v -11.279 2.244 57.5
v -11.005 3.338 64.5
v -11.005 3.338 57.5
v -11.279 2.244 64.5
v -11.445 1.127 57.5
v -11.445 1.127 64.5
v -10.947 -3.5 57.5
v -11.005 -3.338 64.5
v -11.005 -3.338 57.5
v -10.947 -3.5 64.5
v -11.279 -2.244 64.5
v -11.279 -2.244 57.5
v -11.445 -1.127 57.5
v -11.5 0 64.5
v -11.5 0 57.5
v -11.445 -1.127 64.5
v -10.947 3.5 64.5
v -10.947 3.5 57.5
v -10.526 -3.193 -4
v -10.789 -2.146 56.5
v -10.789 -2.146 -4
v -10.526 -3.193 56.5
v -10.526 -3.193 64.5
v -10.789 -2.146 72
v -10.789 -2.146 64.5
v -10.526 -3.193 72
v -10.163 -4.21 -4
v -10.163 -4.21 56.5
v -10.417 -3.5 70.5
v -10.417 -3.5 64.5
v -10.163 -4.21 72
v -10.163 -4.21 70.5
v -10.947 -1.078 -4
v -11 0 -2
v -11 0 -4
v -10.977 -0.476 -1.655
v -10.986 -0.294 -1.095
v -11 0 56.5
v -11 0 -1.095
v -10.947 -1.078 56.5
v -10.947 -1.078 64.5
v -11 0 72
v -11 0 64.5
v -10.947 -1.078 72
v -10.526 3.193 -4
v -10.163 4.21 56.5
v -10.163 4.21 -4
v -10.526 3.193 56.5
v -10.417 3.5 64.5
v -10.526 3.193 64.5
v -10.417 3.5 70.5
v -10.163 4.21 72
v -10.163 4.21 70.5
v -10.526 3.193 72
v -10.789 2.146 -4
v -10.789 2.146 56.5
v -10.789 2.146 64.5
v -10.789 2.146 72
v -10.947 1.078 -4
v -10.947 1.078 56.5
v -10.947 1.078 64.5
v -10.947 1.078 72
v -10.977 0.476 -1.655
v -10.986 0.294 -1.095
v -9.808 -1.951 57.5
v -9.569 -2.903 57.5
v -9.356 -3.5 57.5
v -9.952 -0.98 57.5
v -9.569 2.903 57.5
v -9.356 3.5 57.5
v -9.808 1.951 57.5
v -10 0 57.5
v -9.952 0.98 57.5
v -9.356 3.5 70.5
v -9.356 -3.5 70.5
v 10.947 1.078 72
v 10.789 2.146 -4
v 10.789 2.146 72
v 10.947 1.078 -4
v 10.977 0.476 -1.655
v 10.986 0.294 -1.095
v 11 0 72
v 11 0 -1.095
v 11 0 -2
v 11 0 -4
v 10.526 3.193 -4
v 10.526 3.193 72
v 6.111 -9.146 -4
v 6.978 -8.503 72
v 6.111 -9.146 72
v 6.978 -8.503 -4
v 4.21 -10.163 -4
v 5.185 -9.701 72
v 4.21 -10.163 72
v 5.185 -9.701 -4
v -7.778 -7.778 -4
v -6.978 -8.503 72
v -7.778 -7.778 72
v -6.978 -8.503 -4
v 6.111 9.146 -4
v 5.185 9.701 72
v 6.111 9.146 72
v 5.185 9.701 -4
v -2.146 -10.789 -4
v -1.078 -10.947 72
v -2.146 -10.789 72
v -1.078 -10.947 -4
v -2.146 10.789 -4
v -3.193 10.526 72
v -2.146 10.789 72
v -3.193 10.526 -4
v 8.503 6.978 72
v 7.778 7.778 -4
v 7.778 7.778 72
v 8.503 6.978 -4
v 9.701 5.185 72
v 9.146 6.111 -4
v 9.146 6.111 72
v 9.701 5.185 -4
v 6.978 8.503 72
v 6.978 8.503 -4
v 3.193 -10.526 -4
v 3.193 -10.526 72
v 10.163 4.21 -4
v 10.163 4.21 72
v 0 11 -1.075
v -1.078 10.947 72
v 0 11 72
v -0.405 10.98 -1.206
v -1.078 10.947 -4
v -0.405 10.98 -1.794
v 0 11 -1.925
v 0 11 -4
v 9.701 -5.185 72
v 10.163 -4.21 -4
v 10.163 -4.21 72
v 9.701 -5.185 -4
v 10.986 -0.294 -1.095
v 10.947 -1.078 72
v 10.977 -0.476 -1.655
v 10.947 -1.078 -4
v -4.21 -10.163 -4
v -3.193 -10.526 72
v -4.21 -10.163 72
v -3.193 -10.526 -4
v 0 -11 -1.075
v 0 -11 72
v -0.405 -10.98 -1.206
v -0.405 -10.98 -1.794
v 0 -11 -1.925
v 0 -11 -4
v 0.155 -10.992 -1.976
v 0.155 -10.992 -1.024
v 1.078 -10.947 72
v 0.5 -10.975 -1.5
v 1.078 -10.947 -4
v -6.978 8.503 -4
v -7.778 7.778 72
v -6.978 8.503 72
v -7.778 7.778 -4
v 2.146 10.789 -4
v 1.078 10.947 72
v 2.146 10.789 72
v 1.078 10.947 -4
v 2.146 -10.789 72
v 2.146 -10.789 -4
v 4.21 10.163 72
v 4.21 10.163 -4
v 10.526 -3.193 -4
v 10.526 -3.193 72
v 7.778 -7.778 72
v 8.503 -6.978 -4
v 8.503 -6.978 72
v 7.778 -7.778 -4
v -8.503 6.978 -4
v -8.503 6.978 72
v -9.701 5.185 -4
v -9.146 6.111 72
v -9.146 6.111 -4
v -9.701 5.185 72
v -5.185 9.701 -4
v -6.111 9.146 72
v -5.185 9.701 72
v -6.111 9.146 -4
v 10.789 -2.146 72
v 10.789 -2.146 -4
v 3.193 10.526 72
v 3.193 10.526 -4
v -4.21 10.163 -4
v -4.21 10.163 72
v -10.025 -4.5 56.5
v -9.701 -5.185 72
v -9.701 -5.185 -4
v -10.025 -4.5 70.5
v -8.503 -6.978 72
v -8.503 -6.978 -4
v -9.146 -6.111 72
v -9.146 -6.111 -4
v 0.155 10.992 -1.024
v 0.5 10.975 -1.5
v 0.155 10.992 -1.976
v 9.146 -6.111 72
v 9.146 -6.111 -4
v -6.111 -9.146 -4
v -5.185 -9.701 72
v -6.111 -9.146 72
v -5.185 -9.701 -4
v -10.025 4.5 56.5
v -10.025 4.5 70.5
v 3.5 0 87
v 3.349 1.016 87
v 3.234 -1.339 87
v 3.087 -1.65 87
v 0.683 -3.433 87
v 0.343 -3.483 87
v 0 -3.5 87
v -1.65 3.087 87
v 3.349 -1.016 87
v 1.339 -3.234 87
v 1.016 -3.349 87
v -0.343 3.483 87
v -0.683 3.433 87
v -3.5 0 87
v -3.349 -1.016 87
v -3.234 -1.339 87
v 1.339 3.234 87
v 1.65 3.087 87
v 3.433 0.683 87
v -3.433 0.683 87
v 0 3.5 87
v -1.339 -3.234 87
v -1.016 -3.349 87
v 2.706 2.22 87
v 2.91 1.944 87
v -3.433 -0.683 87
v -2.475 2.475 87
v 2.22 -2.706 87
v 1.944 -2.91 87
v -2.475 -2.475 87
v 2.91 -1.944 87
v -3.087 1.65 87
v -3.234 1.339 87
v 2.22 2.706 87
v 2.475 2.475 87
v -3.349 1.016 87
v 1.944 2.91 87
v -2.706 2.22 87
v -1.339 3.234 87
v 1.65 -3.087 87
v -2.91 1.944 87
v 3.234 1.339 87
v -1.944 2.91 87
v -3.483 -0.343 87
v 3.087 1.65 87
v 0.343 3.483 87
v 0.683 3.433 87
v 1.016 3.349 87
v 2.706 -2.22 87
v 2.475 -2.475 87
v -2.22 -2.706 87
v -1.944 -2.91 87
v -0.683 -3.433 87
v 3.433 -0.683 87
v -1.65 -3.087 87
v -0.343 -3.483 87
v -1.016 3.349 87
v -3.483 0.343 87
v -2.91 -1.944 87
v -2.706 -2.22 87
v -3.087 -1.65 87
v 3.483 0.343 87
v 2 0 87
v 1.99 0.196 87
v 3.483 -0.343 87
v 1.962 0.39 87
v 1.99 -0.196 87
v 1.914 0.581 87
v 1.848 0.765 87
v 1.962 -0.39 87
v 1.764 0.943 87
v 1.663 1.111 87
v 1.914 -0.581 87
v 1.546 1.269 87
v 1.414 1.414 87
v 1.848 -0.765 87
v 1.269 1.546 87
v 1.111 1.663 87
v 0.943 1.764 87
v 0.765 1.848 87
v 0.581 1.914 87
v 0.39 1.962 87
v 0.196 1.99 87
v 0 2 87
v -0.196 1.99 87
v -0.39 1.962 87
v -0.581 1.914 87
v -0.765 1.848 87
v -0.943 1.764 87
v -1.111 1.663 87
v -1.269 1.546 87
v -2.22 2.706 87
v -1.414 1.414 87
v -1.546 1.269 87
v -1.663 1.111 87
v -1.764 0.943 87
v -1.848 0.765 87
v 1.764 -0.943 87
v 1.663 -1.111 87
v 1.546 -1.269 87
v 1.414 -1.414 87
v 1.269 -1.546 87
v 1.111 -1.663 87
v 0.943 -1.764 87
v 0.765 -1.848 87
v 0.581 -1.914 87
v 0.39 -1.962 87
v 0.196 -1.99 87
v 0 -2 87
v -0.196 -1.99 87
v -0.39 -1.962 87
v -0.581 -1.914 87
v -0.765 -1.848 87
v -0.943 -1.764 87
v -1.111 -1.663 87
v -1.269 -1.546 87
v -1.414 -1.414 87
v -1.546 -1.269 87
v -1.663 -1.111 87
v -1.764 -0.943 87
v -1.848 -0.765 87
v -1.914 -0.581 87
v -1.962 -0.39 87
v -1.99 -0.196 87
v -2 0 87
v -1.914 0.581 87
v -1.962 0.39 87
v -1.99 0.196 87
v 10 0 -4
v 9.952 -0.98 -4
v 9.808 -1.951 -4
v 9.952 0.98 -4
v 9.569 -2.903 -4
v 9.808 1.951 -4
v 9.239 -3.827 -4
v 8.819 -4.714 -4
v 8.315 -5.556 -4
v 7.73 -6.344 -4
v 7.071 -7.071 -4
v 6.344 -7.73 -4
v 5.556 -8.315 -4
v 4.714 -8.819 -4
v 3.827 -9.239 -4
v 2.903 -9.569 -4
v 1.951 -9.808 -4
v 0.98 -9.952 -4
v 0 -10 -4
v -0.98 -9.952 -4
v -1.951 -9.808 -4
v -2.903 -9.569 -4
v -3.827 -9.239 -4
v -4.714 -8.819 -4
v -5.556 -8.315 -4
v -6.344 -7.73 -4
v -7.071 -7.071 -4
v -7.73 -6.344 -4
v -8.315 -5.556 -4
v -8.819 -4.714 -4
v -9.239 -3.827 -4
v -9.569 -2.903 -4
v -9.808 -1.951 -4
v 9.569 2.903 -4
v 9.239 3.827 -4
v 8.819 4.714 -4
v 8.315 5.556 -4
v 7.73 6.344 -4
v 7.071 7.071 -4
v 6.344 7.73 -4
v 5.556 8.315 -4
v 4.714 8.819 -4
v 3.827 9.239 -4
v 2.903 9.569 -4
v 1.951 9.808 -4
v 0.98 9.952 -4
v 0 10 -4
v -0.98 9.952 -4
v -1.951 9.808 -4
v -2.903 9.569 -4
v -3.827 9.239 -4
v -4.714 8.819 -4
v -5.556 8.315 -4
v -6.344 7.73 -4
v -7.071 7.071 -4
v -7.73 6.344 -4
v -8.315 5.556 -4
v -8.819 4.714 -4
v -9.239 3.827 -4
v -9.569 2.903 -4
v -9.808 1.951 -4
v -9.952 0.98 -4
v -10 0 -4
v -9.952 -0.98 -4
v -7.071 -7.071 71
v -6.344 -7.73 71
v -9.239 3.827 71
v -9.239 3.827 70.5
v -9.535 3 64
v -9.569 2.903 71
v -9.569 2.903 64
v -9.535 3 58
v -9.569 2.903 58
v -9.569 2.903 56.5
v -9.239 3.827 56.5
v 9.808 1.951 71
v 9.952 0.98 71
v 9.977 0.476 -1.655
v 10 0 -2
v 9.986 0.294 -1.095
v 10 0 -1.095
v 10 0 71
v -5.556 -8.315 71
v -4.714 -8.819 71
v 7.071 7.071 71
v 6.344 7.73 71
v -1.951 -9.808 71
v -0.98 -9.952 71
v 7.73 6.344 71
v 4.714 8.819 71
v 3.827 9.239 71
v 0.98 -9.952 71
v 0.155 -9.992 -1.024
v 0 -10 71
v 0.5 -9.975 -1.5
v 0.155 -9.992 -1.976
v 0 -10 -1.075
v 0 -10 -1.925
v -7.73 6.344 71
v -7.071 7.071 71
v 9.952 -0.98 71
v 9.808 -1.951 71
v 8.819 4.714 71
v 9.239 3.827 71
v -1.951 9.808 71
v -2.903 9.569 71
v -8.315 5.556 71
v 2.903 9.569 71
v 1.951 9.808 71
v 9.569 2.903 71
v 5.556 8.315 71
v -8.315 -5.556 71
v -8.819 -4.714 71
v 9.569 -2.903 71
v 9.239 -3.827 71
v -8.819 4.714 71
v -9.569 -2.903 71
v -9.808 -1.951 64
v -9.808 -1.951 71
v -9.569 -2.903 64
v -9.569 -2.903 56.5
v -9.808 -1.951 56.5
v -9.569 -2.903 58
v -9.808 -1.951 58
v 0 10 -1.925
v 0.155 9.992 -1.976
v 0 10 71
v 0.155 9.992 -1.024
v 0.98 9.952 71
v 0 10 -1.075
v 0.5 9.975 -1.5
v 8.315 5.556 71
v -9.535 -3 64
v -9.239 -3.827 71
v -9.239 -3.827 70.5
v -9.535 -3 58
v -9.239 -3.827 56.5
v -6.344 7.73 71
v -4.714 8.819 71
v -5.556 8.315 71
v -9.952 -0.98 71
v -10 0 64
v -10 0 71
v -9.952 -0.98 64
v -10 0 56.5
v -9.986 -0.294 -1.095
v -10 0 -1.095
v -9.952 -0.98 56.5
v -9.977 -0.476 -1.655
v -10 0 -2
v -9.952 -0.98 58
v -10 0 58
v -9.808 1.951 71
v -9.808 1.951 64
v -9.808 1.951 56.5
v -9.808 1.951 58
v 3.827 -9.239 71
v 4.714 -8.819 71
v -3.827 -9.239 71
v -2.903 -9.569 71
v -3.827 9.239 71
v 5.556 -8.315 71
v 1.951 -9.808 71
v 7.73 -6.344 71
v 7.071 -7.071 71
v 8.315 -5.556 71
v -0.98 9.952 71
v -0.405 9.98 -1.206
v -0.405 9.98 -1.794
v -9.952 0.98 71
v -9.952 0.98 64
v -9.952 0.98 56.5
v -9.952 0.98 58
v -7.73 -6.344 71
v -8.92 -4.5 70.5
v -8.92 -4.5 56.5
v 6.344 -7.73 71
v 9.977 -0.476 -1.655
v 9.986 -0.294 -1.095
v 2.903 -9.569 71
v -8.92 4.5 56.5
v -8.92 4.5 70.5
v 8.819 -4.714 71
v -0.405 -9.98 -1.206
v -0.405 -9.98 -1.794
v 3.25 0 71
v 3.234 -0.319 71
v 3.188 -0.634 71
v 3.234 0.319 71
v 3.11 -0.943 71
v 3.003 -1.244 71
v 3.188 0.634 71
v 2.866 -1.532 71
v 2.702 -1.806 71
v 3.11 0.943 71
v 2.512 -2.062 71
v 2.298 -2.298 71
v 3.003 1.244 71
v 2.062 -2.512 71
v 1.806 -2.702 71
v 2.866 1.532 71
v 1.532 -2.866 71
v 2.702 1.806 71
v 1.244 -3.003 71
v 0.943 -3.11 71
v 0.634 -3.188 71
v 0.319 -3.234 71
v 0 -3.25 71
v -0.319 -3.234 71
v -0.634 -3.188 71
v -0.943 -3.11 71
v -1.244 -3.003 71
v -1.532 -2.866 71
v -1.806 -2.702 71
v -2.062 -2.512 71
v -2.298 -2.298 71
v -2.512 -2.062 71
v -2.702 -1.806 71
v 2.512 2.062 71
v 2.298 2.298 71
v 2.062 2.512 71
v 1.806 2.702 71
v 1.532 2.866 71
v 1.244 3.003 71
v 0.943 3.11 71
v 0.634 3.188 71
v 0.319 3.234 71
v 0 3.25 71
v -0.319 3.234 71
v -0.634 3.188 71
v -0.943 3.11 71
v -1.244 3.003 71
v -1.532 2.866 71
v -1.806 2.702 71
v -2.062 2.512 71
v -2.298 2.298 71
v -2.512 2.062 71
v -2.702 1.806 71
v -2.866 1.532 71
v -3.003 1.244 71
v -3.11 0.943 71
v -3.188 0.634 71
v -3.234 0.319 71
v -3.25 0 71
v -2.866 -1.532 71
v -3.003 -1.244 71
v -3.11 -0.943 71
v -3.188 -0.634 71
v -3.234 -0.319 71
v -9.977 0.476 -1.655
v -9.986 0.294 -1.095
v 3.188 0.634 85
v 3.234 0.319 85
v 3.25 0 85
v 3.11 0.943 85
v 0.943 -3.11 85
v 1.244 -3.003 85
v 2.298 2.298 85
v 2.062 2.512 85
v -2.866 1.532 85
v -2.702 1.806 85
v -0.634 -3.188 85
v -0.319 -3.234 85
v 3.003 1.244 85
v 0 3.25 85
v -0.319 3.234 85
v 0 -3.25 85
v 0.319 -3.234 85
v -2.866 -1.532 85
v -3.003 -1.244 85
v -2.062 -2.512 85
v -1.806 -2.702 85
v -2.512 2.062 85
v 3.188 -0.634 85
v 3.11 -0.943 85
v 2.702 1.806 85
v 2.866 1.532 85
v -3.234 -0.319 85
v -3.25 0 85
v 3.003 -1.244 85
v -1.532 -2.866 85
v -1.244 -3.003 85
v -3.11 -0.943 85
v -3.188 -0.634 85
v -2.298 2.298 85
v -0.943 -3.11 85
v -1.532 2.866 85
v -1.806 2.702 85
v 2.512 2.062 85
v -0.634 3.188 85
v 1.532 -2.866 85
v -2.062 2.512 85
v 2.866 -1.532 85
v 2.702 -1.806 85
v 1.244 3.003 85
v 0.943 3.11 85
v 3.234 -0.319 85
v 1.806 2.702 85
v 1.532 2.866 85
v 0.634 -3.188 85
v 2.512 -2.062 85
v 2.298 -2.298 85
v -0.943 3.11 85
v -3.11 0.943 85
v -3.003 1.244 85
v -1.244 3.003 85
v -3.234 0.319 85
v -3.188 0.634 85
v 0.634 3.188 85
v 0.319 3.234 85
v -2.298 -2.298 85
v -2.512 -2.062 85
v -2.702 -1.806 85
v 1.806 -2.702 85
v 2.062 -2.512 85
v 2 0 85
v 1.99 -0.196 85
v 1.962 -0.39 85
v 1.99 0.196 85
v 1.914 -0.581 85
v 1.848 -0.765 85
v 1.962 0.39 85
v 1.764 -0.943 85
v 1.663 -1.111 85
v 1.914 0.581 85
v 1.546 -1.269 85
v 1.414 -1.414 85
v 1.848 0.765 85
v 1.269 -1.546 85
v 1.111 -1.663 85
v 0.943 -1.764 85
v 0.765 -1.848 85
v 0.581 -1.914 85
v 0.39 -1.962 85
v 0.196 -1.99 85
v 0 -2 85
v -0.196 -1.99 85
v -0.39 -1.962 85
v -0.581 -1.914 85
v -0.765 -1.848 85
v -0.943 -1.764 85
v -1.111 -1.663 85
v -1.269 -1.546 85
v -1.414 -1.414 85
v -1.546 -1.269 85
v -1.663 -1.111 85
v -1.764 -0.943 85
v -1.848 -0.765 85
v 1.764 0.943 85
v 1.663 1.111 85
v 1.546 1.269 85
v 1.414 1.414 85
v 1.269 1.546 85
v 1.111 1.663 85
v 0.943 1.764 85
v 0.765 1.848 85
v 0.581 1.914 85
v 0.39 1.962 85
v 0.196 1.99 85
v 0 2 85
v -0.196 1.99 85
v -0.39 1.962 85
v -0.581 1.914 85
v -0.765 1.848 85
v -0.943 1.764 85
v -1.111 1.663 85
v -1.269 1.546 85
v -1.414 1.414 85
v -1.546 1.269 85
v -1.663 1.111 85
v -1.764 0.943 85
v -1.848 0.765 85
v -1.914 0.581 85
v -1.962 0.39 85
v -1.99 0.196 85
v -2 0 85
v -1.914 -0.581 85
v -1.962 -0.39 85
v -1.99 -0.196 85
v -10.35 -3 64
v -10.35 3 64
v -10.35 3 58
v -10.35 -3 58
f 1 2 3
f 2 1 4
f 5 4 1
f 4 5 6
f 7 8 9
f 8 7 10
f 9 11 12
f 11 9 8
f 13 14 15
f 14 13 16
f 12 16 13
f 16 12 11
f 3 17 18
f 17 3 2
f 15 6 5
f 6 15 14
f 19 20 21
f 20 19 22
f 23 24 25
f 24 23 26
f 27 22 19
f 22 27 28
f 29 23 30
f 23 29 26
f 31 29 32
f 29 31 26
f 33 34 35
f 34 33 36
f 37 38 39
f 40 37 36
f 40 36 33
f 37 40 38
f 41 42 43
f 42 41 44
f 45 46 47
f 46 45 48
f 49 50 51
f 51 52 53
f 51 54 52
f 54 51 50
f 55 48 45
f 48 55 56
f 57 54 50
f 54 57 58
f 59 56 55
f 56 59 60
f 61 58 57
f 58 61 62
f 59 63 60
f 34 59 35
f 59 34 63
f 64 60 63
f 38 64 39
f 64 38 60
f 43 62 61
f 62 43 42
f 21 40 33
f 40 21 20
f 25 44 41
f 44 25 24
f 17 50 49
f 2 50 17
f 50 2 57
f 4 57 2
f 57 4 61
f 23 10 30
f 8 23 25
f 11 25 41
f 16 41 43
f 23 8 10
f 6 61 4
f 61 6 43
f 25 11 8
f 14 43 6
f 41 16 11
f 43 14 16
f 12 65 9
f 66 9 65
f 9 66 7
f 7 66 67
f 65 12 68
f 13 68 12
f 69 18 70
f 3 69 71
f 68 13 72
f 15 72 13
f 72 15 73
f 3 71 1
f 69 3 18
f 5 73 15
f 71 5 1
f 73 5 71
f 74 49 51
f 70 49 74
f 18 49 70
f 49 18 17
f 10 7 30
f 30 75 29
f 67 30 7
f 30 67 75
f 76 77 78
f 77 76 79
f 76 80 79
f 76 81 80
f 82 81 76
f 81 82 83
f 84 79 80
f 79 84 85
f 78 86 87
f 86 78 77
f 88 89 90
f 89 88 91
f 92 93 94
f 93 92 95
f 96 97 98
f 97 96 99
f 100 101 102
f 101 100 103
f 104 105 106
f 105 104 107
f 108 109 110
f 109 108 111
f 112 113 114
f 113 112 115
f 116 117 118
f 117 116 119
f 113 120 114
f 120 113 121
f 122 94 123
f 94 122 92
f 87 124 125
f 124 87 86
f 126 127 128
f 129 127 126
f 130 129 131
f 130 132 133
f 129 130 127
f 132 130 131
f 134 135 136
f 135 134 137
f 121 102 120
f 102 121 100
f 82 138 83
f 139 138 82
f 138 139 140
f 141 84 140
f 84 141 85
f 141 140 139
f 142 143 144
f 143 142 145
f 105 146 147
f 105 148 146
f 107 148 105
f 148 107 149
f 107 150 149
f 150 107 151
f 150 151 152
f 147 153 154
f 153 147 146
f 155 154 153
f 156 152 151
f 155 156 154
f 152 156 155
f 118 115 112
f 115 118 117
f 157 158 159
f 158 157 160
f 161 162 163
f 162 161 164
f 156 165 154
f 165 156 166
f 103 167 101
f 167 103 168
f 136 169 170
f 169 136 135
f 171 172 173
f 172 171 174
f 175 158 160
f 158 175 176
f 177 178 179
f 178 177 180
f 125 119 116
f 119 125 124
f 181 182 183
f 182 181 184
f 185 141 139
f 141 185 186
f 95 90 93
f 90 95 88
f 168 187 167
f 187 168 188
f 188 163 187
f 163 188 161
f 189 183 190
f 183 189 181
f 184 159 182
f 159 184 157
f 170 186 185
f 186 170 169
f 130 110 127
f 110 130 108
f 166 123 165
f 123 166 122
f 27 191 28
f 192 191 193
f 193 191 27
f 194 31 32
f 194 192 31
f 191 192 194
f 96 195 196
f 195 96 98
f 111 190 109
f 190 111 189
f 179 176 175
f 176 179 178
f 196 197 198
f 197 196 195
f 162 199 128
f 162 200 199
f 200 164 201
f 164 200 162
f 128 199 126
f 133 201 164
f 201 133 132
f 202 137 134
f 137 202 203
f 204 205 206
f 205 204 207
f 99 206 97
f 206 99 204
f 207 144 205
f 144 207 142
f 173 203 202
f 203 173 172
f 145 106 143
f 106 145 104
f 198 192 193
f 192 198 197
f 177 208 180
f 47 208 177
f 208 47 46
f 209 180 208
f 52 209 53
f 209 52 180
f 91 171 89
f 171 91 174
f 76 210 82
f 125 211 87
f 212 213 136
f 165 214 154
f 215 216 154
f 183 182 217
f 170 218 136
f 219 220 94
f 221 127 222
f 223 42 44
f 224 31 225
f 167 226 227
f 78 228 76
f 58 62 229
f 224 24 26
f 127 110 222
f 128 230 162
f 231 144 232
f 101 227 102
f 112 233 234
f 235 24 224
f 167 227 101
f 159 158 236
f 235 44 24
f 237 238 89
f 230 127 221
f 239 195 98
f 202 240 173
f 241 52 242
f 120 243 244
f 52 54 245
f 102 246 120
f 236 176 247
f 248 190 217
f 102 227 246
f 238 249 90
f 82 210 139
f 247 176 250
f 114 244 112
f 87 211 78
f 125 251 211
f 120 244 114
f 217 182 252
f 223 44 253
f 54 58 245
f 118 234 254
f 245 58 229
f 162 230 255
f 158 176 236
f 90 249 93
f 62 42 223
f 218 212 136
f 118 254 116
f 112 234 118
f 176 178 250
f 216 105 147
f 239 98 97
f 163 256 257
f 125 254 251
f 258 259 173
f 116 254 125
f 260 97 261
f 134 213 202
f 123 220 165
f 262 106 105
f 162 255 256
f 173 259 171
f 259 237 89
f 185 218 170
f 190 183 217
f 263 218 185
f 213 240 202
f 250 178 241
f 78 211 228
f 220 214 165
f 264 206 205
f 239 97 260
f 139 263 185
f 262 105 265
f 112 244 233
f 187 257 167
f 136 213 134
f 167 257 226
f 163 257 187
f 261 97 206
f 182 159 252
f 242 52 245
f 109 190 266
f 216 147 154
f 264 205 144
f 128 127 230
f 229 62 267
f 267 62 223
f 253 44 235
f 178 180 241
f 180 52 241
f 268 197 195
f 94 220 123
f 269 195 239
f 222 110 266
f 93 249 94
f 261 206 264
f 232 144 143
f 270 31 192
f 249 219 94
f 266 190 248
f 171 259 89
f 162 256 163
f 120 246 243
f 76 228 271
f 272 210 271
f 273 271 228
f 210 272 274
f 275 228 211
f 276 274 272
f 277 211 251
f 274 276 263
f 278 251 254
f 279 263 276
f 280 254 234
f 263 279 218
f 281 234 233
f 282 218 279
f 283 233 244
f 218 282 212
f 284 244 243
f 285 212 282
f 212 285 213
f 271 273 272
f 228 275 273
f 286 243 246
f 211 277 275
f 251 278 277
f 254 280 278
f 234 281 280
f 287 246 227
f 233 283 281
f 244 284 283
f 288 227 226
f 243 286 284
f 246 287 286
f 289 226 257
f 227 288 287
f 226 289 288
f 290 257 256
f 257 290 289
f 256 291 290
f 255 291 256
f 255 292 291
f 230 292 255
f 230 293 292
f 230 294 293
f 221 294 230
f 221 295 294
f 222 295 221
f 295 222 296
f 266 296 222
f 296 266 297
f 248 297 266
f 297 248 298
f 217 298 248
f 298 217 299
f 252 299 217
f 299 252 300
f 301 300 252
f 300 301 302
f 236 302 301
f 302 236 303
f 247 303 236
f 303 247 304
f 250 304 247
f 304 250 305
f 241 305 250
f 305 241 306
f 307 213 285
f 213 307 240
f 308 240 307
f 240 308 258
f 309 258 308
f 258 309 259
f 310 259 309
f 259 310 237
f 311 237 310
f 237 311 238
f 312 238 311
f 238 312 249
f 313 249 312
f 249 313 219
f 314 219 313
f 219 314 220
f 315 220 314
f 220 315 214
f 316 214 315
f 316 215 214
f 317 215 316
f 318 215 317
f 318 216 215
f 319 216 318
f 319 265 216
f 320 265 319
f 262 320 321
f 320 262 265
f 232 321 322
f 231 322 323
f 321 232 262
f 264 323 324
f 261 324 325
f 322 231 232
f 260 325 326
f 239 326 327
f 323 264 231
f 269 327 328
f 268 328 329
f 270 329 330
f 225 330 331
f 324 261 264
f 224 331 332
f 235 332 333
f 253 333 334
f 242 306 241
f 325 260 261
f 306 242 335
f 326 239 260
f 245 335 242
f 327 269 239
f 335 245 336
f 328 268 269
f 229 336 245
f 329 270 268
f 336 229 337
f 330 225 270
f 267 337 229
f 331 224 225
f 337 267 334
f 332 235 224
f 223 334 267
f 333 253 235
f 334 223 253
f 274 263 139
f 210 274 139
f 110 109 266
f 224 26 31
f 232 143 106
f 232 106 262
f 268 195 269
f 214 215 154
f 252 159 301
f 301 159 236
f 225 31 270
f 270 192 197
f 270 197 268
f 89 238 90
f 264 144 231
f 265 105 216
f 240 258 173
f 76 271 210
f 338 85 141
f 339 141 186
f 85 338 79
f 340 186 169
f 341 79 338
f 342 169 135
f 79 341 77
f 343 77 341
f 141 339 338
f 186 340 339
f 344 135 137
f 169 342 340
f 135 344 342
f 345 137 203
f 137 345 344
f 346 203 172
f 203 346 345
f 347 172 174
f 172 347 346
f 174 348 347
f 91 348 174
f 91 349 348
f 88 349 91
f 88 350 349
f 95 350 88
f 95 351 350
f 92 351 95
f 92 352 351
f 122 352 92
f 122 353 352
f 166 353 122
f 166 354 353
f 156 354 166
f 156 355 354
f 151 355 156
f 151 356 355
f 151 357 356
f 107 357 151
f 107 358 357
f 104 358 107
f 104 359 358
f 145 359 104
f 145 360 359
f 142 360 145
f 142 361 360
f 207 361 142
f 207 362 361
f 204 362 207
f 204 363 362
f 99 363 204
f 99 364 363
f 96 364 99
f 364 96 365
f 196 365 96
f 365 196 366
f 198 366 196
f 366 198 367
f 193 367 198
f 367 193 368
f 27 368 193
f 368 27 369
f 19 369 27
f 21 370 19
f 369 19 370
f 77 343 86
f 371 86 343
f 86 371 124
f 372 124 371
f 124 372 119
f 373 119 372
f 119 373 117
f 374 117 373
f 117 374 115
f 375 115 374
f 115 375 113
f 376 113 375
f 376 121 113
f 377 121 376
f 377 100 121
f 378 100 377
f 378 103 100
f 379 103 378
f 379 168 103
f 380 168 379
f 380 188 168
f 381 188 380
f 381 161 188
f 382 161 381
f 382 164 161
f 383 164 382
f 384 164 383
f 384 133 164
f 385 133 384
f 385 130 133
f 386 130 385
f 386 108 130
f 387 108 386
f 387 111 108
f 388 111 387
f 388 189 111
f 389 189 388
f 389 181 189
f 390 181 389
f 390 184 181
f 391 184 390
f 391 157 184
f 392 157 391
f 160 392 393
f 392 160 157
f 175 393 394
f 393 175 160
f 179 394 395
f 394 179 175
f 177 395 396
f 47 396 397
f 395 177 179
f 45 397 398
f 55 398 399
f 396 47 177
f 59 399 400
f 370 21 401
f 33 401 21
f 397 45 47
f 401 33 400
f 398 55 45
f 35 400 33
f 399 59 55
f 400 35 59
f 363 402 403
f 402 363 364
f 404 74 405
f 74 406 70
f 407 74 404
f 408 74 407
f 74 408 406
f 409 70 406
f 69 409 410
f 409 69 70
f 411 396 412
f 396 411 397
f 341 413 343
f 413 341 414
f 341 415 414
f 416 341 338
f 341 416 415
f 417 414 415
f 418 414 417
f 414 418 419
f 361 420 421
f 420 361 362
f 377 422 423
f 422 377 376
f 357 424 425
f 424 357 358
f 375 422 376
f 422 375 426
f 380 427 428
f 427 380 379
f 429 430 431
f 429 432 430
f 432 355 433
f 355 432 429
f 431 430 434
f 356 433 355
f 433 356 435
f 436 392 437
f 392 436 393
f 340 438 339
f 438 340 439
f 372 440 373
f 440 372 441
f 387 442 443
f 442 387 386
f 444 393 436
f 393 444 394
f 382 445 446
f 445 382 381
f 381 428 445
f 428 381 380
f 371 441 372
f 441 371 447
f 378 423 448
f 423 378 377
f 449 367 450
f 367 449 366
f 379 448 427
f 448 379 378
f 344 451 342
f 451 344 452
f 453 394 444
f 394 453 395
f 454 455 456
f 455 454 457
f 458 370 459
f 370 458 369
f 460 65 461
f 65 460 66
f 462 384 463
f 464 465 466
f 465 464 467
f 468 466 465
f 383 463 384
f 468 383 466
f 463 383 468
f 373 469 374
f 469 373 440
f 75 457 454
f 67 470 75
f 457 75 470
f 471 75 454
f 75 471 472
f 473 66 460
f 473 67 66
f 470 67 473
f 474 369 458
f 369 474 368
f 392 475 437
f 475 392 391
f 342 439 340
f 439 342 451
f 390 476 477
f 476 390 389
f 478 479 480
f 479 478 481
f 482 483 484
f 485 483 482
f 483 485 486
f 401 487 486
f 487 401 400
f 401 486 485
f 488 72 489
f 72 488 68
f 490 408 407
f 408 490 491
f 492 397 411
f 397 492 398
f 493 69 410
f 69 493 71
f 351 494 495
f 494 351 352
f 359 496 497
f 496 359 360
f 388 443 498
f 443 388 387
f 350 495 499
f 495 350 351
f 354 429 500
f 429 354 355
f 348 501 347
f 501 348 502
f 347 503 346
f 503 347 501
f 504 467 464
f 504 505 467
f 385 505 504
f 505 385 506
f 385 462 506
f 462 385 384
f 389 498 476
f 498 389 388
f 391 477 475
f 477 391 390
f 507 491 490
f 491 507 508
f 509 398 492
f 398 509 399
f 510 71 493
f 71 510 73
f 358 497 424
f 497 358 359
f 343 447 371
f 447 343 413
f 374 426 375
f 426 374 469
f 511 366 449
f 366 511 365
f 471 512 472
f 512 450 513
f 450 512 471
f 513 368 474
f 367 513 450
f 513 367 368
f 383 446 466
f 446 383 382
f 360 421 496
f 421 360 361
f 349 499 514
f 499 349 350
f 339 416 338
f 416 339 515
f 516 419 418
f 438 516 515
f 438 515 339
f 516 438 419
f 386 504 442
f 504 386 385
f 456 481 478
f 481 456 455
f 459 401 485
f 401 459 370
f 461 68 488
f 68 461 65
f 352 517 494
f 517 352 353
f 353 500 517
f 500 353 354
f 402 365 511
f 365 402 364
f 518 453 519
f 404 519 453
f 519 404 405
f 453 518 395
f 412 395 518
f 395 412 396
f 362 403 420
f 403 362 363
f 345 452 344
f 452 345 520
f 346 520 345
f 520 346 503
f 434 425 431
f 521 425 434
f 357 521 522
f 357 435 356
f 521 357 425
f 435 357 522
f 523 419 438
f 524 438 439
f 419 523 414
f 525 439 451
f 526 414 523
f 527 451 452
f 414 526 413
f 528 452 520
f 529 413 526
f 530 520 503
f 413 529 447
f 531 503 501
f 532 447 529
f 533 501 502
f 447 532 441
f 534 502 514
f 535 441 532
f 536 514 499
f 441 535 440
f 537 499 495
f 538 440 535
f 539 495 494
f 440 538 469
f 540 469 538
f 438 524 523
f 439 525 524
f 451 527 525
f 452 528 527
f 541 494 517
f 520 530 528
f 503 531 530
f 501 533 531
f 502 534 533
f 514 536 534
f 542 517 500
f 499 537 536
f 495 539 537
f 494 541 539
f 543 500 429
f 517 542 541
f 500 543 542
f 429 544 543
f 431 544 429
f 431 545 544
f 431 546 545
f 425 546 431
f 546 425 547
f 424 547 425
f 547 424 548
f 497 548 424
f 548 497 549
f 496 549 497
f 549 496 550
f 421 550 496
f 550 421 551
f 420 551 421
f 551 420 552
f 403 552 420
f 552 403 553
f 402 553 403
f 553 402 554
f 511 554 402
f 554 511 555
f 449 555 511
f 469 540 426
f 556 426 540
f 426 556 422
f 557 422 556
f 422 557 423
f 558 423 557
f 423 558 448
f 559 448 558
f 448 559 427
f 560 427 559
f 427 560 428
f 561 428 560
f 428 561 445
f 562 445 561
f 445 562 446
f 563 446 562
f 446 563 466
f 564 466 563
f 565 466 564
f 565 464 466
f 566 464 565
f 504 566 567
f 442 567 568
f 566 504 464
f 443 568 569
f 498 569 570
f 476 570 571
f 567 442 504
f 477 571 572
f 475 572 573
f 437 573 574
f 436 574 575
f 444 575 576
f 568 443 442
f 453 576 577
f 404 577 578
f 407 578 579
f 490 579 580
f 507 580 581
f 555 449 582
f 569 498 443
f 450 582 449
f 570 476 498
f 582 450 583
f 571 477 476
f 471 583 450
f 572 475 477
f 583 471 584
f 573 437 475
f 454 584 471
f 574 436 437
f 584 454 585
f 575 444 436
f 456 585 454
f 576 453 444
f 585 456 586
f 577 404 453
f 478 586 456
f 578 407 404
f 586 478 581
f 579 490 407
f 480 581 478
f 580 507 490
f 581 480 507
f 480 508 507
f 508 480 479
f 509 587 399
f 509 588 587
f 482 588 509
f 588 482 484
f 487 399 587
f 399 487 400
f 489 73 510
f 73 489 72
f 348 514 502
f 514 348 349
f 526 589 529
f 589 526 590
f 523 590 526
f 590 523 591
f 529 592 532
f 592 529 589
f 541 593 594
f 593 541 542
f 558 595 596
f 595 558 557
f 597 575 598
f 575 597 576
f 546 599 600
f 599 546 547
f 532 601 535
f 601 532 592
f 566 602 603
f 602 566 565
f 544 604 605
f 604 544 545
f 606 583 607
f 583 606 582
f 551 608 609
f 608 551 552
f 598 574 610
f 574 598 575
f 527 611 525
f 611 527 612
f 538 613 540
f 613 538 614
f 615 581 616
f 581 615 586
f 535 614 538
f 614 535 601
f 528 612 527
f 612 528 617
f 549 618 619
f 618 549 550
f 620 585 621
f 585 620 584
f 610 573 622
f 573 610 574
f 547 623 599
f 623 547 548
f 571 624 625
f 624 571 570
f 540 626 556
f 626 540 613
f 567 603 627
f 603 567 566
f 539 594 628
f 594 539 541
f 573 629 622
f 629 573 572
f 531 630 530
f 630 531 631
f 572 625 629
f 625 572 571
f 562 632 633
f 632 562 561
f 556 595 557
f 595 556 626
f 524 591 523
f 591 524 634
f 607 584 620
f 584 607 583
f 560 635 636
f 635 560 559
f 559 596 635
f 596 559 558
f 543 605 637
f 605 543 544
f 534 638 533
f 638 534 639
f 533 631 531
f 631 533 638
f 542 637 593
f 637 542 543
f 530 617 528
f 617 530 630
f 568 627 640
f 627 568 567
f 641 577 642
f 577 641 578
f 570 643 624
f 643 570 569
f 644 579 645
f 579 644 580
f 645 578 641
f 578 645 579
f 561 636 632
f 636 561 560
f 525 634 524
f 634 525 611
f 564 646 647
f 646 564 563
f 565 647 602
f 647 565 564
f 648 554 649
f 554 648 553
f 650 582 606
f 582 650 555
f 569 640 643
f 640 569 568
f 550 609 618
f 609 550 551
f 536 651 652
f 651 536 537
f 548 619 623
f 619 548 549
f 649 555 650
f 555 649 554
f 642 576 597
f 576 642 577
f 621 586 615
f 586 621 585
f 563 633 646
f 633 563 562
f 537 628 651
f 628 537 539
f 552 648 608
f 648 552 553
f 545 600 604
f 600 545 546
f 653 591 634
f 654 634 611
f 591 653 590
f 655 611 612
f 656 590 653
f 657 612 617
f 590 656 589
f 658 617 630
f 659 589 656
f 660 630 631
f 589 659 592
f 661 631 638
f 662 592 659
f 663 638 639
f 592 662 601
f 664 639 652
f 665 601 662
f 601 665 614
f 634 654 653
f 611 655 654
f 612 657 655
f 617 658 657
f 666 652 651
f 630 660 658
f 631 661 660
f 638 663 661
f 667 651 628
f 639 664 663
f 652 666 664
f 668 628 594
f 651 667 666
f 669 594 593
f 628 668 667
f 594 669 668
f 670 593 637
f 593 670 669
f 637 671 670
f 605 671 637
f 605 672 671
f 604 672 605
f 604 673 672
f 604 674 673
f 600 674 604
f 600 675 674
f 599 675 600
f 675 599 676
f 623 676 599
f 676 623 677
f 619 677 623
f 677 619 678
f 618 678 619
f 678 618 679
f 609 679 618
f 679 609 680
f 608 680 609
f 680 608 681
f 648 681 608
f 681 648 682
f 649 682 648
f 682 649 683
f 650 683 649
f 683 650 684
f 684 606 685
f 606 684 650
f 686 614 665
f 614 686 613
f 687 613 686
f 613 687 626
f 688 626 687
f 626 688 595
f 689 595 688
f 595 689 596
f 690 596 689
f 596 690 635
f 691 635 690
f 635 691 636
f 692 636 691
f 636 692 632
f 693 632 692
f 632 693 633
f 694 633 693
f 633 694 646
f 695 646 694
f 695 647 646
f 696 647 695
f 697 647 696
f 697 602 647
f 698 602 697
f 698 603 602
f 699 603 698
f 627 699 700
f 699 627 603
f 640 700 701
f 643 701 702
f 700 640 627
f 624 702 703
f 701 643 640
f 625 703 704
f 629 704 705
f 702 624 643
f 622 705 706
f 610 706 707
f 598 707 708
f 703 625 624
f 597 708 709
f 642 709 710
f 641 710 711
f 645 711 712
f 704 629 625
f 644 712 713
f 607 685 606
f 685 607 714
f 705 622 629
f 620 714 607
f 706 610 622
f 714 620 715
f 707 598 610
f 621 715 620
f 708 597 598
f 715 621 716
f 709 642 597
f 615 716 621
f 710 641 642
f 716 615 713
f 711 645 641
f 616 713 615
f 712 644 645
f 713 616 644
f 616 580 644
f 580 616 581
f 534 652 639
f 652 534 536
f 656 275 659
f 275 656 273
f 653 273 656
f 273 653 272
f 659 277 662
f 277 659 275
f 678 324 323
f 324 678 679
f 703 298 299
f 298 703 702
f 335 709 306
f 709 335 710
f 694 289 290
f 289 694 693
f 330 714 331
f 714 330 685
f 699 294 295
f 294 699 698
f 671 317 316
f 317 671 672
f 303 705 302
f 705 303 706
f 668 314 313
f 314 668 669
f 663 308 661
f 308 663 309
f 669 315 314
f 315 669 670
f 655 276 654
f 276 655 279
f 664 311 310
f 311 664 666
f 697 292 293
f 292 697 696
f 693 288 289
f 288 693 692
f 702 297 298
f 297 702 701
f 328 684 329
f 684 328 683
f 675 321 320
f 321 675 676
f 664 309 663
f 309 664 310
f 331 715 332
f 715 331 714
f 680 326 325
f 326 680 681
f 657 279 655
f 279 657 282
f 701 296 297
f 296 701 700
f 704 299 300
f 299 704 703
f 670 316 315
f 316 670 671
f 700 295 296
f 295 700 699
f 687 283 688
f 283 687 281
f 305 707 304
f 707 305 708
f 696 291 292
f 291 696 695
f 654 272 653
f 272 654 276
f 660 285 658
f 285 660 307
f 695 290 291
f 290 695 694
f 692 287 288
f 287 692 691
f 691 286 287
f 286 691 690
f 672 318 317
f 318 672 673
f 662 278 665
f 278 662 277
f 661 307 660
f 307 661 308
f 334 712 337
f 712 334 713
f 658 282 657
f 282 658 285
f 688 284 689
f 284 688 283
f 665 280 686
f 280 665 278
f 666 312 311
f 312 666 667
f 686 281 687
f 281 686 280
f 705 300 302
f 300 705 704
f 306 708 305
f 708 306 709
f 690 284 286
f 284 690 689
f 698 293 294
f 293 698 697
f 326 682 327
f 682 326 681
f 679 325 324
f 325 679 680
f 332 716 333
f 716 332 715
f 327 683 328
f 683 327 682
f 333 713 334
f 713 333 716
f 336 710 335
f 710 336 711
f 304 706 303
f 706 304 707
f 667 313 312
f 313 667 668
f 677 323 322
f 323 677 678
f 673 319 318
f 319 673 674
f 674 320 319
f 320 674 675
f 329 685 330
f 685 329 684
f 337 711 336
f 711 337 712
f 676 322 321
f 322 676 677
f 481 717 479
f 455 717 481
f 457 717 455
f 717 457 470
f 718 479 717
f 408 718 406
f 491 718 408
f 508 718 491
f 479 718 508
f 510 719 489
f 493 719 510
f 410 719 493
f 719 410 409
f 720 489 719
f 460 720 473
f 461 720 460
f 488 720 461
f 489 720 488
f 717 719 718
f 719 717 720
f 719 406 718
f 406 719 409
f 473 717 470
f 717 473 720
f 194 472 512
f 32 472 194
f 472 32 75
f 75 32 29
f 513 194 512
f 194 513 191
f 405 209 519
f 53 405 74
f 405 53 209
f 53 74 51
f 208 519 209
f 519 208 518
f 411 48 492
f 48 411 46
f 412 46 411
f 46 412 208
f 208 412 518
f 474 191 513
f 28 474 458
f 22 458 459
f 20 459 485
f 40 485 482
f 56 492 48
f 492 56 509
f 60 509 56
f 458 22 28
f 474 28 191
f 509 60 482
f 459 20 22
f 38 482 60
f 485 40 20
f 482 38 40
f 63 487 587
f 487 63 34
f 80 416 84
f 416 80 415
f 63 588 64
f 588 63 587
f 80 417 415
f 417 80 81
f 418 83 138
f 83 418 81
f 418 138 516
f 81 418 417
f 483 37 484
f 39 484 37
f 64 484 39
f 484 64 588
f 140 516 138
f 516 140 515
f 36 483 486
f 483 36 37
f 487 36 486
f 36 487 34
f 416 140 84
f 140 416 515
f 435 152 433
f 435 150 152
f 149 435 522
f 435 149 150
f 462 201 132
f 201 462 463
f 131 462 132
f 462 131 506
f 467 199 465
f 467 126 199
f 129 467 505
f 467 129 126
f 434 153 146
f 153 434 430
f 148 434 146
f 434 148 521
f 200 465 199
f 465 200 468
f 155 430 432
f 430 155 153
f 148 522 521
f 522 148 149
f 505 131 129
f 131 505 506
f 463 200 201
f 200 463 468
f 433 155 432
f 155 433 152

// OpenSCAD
difference()
{
translate([0,0,0])
union() {
translate([0,0,0])
    cylinder(d=22, h=72, $fn=64);
translate([0,0,72])
    cylinder(d1=22, d2=7, h=15, $fn=64);

intersection() {
translate([0,0,0])
    difference() {
        cylinder(d=23, h=72, $fn=64);
        cylinder(d=22, h=72, $fn=64);
    }
translate([-10.5,0,61])
    cube([4,7,7], center=true);
}
translate([0,0,-4])
    cylinder(d1=22, d2=22, h=4, $fn=64);    

}

translate([0,0,1])
union() {

translate([0,0,0])
    cylinder(d=20, h=70, $fn=64);
//translate([0,0,-2])
//    cylinder(d1=23, d2=20, h=2, $fn=64);
translate([0,0,-5])
    cylinder(d1=20, d2=20, h=5, $fn=64);

translate([0,0,70])
    cylinder(d=6.5, h=14, $fn=64);

translate([0,0,84.0])
    cylinder(d=4, h=5, $fn=64);

translate([-9.6,0,60])
    cube([1.5,6,6], center=true);

translate([-10.5,-4,63])
    cube([5,1,13], center=true);
translate([-10.5,4,63])
    cube([5,1,13], center=true);
translate([-10.5,0,56.0])
    cube([5,9,1], center=true);
    
translate([0,0,-2.5])
    rotate([0,90,0])
        cylinder(d=1, h=25, center=true);
translate([0,0,-2.5])
    rotate([90,0,0])
        cylinder(d=1, h=25, center=true);

}
}
